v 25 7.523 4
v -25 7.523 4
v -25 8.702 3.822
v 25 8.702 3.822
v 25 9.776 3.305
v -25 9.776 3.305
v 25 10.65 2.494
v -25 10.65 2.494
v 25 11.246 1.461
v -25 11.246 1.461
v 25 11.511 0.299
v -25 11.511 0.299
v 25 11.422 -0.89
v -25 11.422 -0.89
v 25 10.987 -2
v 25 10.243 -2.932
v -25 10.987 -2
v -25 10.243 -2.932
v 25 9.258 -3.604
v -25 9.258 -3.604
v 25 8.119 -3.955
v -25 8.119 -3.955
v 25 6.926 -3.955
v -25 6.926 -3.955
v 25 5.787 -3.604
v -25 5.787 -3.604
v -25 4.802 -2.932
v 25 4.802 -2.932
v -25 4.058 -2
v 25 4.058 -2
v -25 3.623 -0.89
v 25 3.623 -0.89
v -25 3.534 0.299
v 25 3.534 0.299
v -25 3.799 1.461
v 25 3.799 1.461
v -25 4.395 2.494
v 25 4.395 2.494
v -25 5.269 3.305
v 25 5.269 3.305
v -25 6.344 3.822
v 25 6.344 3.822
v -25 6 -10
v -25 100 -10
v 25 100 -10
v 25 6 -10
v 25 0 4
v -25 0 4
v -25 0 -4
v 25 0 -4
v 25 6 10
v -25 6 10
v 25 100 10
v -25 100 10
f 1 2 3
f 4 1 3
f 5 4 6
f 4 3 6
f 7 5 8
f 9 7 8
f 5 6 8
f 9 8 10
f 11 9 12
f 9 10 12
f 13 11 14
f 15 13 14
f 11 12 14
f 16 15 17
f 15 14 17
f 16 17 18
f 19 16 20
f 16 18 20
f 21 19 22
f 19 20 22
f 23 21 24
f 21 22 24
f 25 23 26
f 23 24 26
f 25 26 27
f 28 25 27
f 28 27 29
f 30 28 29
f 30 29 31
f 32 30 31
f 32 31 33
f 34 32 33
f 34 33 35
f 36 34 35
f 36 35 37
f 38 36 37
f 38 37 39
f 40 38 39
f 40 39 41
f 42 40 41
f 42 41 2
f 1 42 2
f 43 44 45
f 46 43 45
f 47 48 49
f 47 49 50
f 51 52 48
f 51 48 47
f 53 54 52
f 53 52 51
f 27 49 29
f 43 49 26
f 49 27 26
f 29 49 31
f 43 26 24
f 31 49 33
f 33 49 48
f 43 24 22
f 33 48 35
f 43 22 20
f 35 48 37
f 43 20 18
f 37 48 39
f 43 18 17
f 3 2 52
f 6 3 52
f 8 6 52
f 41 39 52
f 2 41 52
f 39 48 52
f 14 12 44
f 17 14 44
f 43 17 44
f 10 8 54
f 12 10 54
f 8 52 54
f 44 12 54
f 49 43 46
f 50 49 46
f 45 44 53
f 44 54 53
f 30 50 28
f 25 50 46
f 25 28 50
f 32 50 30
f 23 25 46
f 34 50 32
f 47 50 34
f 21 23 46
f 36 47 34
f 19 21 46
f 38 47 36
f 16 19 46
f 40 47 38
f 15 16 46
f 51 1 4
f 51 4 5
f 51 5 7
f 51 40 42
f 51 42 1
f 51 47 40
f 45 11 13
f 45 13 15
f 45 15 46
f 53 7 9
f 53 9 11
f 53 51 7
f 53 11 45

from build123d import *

# Parameters (mm, degrees)
SKETCH_1_W          = 50
SKETCH_1_H          = 100
EXTRUDE_1_DEPTH     = 10
SKETCH_2_R          = 4
CUT_EXTRUDE_1_DEPTH = 113.249721603
CHAMFER_1_SIZE      = 6


with BuildPart() as part:
    # 草图1 → 凸台-拉伸1 (new, symmetric)
    with BuildSketch(Plane.XY):
        with Locations((0, 50)):
            Rectangle(SKETCH_1_W, SKETCH_1_H)
    extrude(amount=EXTRUDE_1_DEPTH, both=True)

    # 草图2 → 切除-拉伸1 (cut, through all)
    with BuildSketch(Plane.ZY.offset(25)):
        with Locations((0, 7.522576351)):
            Circle(SKETCH_2_R)
    extrude(amount=-CUT_EXTRUDE_1_DEPTH, mode=Mode.SUBTRACT)

    # 倒角1
    chamfer_1_edges = [part.edges().sort_by_distance(p)[0] for p in [
        (0, 0, 10),
        (0, 0, -10),
    ]]
    chamfer(chamfer_1_edges, length=CHAMFER_1_SIZE)


solid = part.part
